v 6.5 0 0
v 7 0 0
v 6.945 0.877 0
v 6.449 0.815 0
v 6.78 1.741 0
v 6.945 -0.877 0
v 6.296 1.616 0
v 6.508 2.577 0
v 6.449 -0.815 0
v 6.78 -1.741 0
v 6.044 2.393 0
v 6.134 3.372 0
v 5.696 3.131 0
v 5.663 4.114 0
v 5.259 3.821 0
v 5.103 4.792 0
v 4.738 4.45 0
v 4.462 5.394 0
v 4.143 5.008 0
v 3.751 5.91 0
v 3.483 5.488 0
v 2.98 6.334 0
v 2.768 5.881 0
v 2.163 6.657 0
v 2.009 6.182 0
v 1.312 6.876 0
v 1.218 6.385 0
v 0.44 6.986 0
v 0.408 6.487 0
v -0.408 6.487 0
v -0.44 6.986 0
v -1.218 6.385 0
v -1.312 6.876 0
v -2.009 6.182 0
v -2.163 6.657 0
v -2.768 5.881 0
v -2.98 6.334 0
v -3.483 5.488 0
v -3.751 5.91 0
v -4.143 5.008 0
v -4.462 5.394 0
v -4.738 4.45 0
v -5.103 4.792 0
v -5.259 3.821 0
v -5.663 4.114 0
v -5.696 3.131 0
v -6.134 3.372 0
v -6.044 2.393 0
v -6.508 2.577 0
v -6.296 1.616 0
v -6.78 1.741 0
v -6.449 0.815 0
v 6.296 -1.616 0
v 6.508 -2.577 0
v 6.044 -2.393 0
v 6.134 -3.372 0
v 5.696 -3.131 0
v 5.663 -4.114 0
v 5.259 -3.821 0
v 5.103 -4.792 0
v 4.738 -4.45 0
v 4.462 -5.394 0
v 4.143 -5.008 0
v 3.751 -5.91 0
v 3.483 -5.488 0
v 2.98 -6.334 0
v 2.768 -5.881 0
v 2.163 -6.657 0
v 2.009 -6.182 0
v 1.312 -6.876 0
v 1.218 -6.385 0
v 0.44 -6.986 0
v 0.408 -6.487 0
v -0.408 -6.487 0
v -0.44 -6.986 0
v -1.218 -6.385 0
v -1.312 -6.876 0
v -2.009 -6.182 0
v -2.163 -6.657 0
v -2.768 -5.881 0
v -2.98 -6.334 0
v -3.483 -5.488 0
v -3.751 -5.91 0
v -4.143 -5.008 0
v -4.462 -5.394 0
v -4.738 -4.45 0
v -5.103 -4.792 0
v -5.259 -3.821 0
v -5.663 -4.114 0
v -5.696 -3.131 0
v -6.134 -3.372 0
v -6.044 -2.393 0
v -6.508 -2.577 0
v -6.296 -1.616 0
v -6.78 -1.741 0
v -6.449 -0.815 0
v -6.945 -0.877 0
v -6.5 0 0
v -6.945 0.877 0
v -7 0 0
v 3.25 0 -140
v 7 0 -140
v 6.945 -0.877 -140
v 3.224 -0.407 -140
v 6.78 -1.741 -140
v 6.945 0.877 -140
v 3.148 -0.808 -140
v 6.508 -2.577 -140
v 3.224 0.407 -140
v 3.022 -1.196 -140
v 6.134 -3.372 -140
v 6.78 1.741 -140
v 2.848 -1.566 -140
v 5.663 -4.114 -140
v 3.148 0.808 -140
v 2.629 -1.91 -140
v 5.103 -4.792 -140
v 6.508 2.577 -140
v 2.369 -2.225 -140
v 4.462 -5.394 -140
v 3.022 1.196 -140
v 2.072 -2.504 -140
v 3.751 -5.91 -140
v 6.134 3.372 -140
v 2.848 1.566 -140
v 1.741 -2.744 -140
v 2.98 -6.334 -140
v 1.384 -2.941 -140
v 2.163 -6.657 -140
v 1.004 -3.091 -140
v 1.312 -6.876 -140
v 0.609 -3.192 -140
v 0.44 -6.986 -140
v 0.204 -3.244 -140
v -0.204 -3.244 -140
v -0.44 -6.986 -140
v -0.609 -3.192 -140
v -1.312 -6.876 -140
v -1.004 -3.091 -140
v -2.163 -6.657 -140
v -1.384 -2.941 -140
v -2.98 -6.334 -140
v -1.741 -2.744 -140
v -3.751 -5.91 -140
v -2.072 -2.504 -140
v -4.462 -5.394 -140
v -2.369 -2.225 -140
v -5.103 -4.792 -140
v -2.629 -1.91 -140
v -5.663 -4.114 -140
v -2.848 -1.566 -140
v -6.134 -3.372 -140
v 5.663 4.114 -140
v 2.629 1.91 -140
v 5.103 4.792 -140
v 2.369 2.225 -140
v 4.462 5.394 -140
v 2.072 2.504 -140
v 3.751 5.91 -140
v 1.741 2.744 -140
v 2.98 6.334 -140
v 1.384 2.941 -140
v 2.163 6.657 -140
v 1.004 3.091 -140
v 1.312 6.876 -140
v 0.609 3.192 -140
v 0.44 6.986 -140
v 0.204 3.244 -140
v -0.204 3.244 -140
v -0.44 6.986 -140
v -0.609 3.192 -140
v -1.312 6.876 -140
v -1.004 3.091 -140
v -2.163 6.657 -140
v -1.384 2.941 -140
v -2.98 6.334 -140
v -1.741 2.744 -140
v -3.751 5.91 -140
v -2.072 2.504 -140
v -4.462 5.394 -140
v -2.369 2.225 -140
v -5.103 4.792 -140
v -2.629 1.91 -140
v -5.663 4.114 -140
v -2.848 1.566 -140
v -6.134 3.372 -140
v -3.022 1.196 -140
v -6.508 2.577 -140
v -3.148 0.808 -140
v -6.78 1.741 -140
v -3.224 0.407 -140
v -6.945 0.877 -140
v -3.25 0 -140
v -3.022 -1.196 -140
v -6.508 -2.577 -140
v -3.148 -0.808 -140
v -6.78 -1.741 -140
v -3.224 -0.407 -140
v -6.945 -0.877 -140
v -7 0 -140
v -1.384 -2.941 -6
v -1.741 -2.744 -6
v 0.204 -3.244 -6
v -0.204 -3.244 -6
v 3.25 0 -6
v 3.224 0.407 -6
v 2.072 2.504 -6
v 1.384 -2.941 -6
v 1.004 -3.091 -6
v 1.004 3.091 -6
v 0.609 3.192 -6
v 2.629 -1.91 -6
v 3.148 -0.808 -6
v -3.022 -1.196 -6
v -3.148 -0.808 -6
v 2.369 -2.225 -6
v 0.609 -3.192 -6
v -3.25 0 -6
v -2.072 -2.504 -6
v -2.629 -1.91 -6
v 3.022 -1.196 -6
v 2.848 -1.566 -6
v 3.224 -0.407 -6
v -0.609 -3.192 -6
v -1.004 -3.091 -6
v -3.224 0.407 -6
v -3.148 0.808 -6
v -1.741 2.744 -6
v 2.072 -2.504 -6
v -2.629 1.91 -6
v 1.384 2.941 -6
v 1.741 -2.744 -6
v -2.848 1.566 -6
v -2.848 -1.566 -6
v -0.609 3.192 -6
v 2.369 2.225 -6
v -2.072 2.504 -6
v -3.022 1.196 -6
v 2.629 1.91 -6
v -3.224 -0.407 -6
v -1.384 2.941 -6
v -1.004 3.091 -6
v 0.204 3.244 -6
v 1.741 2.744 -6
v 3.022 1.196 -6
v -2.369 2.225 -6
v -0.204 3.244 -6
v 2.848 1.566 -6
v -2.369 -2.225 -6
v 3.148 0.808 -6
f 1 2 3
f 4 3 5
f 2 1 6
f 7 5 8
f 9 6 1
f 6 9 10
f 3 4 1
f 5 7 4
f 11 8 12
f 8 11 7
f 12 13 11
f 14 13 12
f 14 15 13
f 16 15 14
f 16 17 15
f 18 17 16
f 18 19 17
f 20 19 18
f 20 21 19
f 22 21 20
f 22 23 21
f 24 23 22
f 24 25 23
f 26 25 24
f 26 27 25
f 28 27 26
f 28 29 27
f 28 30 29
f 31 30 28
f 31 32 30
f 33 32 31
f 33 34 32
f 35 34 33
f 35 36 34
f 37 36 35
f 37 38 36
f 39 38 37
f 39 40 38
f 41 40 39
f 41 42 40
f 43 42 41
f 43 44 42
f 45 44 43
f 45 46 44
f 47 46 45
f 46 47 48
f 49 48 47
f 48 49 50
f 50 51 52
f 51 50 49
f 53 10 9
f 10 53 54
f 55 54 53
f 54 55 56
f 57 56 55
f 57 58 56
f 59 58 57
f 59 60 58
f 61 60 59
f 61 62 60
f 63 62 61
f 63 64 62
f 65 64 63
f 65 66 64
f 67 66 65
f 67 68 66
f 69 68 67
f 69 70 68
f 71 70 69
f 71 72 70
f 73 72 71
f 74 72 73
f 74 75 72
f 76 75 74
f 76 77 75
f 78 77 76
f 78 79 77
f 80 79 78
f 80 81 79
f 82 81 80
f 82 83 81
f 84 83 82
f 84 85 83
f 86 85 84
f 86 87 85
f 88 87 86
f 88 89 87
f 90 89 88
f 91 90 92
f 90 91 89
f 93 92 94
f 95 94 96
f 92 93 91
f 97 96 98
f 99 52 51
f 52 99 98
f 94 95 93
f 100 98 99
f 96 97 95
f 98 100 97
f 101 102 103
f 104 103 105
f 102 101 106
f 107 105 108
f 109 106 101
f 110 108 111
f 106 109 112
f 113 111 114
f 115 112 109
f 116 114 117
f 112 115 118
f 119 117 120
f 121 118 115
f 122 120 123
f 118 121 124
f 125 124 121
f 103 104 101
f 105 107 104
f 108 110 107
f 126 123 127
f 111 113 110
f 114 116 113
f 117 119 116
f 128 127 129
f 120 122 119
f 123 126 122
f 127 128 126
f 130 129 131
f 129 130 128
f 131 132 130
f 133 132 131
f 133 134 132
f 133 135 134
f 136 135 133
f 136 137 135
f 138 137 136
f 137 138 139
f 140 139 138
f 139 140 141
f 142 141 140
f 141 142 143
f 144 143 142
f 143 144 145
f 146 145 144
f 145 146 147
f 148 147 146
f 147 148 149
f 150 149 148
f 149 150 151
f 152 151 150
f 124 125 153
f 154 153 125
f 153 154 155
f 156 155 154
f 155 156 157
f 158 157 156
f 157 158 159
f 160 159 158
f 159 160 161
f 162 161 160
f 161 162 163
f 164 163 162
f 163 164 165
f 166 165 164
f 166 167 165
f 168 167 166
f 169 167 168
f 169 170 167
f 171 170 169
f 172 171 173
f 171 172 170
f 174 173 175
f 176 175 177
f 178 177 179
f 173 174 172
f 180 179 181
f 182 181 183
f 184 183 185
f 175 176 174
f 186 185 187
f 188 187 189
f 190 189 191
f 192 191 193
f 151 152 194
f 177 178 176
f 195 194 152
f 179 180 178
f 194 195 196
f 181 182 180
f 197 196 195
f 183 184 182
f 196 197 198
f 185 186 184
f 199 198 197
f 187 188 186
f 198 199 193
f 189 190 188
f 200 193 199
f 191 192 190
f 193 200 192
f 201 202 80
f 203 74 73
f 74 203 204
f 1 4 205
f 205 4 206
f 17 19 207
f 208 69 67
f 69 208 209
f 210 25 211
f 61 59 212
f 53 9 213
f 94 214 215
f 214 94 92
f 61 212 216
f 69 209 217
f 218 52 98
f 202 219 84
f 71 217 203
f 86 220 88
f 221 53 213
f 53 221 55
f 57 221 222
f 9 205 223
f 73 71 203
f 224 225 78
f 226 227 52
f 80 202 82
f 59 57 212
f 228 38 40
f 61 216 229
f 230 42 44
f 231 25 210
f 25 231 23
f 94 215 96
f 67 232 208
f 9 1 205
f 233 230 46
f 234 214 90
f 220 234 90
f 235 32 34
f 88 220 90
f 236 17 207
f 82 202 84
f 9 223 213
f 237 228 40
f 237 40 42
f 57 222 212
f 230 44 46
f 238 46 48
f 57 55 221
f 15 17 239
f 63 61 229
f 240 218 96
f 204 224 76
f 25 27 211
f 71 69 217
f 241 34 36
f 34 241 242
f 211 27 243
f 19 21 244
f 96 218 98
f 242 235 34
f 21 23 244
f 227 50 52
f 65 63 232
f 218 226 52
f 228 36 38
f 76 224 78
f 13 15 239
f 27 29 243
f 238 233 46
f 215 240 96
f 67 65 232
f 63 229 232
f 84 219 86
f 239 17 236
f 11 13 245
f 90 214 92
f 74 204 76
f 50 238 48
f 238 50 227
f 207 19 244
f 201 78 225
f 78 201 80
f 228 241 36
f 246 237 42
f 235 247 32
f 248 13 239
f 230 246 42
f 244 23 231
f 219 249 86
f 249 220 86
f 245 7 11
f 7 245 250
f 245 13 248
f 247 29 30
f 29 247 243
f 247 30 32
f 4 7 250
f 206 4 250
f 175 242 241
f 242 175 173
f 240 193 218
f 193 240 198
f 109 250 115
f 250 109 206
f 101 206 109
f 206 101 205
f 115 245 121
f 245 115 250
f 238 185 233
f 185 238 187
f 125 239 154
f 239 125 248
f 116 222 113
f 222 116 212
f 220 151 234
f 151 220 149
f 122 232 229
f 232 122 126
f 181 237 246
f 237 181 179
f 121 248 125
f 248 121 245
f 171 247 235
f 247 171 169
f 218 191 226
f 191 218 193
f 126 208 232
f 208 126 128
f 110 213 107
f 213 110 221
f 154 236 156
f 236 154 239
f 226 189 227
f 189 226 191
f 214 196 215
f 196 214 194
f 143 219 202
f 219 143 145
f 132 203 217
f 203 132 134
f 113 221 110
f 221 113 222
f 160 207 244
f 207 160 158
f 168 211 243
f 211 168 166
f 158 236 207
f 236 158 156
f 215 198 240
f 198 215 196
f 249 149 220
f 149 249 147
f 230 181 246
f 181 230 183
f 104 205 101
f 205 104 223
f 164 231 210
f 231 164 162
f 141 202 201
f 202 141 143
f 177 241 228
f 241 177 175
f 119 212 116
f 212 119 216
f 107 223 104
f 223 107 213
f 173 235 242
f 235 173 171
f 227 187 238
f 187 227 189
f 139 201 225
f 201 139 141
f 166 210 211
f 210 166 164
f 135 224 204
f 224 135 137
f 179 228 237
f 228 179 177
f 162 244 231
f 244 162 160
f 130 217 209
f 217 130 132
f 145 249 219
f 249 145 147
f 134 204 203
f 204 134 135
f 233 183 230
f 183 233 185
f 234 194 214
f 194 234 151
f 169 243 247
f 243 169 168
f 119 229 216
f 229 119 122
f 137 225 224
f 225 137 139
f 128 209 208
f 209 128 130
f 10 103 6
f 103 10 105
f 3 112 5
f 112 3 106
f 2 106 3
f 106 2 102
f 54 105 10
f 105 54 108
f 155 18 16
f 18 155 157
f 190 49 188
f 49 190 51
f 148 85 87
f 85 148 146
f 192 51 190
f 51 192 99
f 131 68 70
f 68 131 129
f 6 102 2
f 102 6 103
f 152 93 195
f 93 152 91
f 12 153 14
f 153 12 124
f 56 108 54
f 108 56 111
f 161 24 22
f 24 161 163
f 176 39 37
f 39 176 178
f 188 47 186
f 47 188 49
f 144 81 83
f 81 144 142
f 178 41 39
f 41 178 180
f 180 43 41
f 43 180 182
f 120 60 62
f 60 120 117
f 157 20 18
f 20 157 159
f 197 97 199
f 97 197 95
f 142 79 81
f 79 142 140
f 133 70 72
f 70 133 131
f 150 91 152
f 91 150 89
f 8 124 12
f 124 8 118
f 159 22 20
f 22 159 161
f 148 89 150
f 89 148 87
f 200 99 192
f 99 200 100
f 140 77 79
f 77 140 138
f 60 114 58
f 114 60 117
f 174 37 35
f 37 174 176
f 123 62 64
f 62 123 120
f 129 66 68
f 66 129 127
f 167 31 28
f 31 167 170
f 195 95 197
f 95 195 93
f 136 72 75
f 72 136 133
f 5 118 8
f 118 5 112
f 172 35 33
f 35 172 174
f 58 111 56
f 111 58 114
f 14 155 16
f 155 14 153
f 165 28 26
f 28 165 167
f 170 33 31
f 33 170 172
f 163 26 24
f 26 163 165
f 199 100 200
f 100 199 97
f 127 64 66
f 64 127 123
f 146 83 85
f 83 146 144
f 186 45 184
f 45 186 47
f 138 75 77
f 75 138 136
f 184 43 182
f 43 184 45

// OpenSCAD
$fn = 50;


difference() {
	union() {
		translate(v = [0, 0, -140.0000000000]) {
			cylinder(h = 140, r = 7.0000000000);
		}
	}
	union() {
		translate(v = [0, 0, 0]) {
			rotate(a = [0, 0, 0]) {
				difference() {
					union() {
						#translate(v = [0, 0, -140.0000000000]) {
							cylinder(h = 140, r = 2.2500000000);
						}
						#translate(v = [0, 0, -6]) {
							cylinder(h = 6, r1 = 3.2500000000, r2 = 6.5000000000);
						}
						#translate(v = [0, 0, -140.0000000000]) {
							cylinder(h = 140, r = 3.2500000000);
						}
						#translate(v = [0, 0, -140.0000000000]) {
							cylinder(h = 140, r = 2.2500000000);
						}
					}
					union();
				}
			}
		}
	}
}
